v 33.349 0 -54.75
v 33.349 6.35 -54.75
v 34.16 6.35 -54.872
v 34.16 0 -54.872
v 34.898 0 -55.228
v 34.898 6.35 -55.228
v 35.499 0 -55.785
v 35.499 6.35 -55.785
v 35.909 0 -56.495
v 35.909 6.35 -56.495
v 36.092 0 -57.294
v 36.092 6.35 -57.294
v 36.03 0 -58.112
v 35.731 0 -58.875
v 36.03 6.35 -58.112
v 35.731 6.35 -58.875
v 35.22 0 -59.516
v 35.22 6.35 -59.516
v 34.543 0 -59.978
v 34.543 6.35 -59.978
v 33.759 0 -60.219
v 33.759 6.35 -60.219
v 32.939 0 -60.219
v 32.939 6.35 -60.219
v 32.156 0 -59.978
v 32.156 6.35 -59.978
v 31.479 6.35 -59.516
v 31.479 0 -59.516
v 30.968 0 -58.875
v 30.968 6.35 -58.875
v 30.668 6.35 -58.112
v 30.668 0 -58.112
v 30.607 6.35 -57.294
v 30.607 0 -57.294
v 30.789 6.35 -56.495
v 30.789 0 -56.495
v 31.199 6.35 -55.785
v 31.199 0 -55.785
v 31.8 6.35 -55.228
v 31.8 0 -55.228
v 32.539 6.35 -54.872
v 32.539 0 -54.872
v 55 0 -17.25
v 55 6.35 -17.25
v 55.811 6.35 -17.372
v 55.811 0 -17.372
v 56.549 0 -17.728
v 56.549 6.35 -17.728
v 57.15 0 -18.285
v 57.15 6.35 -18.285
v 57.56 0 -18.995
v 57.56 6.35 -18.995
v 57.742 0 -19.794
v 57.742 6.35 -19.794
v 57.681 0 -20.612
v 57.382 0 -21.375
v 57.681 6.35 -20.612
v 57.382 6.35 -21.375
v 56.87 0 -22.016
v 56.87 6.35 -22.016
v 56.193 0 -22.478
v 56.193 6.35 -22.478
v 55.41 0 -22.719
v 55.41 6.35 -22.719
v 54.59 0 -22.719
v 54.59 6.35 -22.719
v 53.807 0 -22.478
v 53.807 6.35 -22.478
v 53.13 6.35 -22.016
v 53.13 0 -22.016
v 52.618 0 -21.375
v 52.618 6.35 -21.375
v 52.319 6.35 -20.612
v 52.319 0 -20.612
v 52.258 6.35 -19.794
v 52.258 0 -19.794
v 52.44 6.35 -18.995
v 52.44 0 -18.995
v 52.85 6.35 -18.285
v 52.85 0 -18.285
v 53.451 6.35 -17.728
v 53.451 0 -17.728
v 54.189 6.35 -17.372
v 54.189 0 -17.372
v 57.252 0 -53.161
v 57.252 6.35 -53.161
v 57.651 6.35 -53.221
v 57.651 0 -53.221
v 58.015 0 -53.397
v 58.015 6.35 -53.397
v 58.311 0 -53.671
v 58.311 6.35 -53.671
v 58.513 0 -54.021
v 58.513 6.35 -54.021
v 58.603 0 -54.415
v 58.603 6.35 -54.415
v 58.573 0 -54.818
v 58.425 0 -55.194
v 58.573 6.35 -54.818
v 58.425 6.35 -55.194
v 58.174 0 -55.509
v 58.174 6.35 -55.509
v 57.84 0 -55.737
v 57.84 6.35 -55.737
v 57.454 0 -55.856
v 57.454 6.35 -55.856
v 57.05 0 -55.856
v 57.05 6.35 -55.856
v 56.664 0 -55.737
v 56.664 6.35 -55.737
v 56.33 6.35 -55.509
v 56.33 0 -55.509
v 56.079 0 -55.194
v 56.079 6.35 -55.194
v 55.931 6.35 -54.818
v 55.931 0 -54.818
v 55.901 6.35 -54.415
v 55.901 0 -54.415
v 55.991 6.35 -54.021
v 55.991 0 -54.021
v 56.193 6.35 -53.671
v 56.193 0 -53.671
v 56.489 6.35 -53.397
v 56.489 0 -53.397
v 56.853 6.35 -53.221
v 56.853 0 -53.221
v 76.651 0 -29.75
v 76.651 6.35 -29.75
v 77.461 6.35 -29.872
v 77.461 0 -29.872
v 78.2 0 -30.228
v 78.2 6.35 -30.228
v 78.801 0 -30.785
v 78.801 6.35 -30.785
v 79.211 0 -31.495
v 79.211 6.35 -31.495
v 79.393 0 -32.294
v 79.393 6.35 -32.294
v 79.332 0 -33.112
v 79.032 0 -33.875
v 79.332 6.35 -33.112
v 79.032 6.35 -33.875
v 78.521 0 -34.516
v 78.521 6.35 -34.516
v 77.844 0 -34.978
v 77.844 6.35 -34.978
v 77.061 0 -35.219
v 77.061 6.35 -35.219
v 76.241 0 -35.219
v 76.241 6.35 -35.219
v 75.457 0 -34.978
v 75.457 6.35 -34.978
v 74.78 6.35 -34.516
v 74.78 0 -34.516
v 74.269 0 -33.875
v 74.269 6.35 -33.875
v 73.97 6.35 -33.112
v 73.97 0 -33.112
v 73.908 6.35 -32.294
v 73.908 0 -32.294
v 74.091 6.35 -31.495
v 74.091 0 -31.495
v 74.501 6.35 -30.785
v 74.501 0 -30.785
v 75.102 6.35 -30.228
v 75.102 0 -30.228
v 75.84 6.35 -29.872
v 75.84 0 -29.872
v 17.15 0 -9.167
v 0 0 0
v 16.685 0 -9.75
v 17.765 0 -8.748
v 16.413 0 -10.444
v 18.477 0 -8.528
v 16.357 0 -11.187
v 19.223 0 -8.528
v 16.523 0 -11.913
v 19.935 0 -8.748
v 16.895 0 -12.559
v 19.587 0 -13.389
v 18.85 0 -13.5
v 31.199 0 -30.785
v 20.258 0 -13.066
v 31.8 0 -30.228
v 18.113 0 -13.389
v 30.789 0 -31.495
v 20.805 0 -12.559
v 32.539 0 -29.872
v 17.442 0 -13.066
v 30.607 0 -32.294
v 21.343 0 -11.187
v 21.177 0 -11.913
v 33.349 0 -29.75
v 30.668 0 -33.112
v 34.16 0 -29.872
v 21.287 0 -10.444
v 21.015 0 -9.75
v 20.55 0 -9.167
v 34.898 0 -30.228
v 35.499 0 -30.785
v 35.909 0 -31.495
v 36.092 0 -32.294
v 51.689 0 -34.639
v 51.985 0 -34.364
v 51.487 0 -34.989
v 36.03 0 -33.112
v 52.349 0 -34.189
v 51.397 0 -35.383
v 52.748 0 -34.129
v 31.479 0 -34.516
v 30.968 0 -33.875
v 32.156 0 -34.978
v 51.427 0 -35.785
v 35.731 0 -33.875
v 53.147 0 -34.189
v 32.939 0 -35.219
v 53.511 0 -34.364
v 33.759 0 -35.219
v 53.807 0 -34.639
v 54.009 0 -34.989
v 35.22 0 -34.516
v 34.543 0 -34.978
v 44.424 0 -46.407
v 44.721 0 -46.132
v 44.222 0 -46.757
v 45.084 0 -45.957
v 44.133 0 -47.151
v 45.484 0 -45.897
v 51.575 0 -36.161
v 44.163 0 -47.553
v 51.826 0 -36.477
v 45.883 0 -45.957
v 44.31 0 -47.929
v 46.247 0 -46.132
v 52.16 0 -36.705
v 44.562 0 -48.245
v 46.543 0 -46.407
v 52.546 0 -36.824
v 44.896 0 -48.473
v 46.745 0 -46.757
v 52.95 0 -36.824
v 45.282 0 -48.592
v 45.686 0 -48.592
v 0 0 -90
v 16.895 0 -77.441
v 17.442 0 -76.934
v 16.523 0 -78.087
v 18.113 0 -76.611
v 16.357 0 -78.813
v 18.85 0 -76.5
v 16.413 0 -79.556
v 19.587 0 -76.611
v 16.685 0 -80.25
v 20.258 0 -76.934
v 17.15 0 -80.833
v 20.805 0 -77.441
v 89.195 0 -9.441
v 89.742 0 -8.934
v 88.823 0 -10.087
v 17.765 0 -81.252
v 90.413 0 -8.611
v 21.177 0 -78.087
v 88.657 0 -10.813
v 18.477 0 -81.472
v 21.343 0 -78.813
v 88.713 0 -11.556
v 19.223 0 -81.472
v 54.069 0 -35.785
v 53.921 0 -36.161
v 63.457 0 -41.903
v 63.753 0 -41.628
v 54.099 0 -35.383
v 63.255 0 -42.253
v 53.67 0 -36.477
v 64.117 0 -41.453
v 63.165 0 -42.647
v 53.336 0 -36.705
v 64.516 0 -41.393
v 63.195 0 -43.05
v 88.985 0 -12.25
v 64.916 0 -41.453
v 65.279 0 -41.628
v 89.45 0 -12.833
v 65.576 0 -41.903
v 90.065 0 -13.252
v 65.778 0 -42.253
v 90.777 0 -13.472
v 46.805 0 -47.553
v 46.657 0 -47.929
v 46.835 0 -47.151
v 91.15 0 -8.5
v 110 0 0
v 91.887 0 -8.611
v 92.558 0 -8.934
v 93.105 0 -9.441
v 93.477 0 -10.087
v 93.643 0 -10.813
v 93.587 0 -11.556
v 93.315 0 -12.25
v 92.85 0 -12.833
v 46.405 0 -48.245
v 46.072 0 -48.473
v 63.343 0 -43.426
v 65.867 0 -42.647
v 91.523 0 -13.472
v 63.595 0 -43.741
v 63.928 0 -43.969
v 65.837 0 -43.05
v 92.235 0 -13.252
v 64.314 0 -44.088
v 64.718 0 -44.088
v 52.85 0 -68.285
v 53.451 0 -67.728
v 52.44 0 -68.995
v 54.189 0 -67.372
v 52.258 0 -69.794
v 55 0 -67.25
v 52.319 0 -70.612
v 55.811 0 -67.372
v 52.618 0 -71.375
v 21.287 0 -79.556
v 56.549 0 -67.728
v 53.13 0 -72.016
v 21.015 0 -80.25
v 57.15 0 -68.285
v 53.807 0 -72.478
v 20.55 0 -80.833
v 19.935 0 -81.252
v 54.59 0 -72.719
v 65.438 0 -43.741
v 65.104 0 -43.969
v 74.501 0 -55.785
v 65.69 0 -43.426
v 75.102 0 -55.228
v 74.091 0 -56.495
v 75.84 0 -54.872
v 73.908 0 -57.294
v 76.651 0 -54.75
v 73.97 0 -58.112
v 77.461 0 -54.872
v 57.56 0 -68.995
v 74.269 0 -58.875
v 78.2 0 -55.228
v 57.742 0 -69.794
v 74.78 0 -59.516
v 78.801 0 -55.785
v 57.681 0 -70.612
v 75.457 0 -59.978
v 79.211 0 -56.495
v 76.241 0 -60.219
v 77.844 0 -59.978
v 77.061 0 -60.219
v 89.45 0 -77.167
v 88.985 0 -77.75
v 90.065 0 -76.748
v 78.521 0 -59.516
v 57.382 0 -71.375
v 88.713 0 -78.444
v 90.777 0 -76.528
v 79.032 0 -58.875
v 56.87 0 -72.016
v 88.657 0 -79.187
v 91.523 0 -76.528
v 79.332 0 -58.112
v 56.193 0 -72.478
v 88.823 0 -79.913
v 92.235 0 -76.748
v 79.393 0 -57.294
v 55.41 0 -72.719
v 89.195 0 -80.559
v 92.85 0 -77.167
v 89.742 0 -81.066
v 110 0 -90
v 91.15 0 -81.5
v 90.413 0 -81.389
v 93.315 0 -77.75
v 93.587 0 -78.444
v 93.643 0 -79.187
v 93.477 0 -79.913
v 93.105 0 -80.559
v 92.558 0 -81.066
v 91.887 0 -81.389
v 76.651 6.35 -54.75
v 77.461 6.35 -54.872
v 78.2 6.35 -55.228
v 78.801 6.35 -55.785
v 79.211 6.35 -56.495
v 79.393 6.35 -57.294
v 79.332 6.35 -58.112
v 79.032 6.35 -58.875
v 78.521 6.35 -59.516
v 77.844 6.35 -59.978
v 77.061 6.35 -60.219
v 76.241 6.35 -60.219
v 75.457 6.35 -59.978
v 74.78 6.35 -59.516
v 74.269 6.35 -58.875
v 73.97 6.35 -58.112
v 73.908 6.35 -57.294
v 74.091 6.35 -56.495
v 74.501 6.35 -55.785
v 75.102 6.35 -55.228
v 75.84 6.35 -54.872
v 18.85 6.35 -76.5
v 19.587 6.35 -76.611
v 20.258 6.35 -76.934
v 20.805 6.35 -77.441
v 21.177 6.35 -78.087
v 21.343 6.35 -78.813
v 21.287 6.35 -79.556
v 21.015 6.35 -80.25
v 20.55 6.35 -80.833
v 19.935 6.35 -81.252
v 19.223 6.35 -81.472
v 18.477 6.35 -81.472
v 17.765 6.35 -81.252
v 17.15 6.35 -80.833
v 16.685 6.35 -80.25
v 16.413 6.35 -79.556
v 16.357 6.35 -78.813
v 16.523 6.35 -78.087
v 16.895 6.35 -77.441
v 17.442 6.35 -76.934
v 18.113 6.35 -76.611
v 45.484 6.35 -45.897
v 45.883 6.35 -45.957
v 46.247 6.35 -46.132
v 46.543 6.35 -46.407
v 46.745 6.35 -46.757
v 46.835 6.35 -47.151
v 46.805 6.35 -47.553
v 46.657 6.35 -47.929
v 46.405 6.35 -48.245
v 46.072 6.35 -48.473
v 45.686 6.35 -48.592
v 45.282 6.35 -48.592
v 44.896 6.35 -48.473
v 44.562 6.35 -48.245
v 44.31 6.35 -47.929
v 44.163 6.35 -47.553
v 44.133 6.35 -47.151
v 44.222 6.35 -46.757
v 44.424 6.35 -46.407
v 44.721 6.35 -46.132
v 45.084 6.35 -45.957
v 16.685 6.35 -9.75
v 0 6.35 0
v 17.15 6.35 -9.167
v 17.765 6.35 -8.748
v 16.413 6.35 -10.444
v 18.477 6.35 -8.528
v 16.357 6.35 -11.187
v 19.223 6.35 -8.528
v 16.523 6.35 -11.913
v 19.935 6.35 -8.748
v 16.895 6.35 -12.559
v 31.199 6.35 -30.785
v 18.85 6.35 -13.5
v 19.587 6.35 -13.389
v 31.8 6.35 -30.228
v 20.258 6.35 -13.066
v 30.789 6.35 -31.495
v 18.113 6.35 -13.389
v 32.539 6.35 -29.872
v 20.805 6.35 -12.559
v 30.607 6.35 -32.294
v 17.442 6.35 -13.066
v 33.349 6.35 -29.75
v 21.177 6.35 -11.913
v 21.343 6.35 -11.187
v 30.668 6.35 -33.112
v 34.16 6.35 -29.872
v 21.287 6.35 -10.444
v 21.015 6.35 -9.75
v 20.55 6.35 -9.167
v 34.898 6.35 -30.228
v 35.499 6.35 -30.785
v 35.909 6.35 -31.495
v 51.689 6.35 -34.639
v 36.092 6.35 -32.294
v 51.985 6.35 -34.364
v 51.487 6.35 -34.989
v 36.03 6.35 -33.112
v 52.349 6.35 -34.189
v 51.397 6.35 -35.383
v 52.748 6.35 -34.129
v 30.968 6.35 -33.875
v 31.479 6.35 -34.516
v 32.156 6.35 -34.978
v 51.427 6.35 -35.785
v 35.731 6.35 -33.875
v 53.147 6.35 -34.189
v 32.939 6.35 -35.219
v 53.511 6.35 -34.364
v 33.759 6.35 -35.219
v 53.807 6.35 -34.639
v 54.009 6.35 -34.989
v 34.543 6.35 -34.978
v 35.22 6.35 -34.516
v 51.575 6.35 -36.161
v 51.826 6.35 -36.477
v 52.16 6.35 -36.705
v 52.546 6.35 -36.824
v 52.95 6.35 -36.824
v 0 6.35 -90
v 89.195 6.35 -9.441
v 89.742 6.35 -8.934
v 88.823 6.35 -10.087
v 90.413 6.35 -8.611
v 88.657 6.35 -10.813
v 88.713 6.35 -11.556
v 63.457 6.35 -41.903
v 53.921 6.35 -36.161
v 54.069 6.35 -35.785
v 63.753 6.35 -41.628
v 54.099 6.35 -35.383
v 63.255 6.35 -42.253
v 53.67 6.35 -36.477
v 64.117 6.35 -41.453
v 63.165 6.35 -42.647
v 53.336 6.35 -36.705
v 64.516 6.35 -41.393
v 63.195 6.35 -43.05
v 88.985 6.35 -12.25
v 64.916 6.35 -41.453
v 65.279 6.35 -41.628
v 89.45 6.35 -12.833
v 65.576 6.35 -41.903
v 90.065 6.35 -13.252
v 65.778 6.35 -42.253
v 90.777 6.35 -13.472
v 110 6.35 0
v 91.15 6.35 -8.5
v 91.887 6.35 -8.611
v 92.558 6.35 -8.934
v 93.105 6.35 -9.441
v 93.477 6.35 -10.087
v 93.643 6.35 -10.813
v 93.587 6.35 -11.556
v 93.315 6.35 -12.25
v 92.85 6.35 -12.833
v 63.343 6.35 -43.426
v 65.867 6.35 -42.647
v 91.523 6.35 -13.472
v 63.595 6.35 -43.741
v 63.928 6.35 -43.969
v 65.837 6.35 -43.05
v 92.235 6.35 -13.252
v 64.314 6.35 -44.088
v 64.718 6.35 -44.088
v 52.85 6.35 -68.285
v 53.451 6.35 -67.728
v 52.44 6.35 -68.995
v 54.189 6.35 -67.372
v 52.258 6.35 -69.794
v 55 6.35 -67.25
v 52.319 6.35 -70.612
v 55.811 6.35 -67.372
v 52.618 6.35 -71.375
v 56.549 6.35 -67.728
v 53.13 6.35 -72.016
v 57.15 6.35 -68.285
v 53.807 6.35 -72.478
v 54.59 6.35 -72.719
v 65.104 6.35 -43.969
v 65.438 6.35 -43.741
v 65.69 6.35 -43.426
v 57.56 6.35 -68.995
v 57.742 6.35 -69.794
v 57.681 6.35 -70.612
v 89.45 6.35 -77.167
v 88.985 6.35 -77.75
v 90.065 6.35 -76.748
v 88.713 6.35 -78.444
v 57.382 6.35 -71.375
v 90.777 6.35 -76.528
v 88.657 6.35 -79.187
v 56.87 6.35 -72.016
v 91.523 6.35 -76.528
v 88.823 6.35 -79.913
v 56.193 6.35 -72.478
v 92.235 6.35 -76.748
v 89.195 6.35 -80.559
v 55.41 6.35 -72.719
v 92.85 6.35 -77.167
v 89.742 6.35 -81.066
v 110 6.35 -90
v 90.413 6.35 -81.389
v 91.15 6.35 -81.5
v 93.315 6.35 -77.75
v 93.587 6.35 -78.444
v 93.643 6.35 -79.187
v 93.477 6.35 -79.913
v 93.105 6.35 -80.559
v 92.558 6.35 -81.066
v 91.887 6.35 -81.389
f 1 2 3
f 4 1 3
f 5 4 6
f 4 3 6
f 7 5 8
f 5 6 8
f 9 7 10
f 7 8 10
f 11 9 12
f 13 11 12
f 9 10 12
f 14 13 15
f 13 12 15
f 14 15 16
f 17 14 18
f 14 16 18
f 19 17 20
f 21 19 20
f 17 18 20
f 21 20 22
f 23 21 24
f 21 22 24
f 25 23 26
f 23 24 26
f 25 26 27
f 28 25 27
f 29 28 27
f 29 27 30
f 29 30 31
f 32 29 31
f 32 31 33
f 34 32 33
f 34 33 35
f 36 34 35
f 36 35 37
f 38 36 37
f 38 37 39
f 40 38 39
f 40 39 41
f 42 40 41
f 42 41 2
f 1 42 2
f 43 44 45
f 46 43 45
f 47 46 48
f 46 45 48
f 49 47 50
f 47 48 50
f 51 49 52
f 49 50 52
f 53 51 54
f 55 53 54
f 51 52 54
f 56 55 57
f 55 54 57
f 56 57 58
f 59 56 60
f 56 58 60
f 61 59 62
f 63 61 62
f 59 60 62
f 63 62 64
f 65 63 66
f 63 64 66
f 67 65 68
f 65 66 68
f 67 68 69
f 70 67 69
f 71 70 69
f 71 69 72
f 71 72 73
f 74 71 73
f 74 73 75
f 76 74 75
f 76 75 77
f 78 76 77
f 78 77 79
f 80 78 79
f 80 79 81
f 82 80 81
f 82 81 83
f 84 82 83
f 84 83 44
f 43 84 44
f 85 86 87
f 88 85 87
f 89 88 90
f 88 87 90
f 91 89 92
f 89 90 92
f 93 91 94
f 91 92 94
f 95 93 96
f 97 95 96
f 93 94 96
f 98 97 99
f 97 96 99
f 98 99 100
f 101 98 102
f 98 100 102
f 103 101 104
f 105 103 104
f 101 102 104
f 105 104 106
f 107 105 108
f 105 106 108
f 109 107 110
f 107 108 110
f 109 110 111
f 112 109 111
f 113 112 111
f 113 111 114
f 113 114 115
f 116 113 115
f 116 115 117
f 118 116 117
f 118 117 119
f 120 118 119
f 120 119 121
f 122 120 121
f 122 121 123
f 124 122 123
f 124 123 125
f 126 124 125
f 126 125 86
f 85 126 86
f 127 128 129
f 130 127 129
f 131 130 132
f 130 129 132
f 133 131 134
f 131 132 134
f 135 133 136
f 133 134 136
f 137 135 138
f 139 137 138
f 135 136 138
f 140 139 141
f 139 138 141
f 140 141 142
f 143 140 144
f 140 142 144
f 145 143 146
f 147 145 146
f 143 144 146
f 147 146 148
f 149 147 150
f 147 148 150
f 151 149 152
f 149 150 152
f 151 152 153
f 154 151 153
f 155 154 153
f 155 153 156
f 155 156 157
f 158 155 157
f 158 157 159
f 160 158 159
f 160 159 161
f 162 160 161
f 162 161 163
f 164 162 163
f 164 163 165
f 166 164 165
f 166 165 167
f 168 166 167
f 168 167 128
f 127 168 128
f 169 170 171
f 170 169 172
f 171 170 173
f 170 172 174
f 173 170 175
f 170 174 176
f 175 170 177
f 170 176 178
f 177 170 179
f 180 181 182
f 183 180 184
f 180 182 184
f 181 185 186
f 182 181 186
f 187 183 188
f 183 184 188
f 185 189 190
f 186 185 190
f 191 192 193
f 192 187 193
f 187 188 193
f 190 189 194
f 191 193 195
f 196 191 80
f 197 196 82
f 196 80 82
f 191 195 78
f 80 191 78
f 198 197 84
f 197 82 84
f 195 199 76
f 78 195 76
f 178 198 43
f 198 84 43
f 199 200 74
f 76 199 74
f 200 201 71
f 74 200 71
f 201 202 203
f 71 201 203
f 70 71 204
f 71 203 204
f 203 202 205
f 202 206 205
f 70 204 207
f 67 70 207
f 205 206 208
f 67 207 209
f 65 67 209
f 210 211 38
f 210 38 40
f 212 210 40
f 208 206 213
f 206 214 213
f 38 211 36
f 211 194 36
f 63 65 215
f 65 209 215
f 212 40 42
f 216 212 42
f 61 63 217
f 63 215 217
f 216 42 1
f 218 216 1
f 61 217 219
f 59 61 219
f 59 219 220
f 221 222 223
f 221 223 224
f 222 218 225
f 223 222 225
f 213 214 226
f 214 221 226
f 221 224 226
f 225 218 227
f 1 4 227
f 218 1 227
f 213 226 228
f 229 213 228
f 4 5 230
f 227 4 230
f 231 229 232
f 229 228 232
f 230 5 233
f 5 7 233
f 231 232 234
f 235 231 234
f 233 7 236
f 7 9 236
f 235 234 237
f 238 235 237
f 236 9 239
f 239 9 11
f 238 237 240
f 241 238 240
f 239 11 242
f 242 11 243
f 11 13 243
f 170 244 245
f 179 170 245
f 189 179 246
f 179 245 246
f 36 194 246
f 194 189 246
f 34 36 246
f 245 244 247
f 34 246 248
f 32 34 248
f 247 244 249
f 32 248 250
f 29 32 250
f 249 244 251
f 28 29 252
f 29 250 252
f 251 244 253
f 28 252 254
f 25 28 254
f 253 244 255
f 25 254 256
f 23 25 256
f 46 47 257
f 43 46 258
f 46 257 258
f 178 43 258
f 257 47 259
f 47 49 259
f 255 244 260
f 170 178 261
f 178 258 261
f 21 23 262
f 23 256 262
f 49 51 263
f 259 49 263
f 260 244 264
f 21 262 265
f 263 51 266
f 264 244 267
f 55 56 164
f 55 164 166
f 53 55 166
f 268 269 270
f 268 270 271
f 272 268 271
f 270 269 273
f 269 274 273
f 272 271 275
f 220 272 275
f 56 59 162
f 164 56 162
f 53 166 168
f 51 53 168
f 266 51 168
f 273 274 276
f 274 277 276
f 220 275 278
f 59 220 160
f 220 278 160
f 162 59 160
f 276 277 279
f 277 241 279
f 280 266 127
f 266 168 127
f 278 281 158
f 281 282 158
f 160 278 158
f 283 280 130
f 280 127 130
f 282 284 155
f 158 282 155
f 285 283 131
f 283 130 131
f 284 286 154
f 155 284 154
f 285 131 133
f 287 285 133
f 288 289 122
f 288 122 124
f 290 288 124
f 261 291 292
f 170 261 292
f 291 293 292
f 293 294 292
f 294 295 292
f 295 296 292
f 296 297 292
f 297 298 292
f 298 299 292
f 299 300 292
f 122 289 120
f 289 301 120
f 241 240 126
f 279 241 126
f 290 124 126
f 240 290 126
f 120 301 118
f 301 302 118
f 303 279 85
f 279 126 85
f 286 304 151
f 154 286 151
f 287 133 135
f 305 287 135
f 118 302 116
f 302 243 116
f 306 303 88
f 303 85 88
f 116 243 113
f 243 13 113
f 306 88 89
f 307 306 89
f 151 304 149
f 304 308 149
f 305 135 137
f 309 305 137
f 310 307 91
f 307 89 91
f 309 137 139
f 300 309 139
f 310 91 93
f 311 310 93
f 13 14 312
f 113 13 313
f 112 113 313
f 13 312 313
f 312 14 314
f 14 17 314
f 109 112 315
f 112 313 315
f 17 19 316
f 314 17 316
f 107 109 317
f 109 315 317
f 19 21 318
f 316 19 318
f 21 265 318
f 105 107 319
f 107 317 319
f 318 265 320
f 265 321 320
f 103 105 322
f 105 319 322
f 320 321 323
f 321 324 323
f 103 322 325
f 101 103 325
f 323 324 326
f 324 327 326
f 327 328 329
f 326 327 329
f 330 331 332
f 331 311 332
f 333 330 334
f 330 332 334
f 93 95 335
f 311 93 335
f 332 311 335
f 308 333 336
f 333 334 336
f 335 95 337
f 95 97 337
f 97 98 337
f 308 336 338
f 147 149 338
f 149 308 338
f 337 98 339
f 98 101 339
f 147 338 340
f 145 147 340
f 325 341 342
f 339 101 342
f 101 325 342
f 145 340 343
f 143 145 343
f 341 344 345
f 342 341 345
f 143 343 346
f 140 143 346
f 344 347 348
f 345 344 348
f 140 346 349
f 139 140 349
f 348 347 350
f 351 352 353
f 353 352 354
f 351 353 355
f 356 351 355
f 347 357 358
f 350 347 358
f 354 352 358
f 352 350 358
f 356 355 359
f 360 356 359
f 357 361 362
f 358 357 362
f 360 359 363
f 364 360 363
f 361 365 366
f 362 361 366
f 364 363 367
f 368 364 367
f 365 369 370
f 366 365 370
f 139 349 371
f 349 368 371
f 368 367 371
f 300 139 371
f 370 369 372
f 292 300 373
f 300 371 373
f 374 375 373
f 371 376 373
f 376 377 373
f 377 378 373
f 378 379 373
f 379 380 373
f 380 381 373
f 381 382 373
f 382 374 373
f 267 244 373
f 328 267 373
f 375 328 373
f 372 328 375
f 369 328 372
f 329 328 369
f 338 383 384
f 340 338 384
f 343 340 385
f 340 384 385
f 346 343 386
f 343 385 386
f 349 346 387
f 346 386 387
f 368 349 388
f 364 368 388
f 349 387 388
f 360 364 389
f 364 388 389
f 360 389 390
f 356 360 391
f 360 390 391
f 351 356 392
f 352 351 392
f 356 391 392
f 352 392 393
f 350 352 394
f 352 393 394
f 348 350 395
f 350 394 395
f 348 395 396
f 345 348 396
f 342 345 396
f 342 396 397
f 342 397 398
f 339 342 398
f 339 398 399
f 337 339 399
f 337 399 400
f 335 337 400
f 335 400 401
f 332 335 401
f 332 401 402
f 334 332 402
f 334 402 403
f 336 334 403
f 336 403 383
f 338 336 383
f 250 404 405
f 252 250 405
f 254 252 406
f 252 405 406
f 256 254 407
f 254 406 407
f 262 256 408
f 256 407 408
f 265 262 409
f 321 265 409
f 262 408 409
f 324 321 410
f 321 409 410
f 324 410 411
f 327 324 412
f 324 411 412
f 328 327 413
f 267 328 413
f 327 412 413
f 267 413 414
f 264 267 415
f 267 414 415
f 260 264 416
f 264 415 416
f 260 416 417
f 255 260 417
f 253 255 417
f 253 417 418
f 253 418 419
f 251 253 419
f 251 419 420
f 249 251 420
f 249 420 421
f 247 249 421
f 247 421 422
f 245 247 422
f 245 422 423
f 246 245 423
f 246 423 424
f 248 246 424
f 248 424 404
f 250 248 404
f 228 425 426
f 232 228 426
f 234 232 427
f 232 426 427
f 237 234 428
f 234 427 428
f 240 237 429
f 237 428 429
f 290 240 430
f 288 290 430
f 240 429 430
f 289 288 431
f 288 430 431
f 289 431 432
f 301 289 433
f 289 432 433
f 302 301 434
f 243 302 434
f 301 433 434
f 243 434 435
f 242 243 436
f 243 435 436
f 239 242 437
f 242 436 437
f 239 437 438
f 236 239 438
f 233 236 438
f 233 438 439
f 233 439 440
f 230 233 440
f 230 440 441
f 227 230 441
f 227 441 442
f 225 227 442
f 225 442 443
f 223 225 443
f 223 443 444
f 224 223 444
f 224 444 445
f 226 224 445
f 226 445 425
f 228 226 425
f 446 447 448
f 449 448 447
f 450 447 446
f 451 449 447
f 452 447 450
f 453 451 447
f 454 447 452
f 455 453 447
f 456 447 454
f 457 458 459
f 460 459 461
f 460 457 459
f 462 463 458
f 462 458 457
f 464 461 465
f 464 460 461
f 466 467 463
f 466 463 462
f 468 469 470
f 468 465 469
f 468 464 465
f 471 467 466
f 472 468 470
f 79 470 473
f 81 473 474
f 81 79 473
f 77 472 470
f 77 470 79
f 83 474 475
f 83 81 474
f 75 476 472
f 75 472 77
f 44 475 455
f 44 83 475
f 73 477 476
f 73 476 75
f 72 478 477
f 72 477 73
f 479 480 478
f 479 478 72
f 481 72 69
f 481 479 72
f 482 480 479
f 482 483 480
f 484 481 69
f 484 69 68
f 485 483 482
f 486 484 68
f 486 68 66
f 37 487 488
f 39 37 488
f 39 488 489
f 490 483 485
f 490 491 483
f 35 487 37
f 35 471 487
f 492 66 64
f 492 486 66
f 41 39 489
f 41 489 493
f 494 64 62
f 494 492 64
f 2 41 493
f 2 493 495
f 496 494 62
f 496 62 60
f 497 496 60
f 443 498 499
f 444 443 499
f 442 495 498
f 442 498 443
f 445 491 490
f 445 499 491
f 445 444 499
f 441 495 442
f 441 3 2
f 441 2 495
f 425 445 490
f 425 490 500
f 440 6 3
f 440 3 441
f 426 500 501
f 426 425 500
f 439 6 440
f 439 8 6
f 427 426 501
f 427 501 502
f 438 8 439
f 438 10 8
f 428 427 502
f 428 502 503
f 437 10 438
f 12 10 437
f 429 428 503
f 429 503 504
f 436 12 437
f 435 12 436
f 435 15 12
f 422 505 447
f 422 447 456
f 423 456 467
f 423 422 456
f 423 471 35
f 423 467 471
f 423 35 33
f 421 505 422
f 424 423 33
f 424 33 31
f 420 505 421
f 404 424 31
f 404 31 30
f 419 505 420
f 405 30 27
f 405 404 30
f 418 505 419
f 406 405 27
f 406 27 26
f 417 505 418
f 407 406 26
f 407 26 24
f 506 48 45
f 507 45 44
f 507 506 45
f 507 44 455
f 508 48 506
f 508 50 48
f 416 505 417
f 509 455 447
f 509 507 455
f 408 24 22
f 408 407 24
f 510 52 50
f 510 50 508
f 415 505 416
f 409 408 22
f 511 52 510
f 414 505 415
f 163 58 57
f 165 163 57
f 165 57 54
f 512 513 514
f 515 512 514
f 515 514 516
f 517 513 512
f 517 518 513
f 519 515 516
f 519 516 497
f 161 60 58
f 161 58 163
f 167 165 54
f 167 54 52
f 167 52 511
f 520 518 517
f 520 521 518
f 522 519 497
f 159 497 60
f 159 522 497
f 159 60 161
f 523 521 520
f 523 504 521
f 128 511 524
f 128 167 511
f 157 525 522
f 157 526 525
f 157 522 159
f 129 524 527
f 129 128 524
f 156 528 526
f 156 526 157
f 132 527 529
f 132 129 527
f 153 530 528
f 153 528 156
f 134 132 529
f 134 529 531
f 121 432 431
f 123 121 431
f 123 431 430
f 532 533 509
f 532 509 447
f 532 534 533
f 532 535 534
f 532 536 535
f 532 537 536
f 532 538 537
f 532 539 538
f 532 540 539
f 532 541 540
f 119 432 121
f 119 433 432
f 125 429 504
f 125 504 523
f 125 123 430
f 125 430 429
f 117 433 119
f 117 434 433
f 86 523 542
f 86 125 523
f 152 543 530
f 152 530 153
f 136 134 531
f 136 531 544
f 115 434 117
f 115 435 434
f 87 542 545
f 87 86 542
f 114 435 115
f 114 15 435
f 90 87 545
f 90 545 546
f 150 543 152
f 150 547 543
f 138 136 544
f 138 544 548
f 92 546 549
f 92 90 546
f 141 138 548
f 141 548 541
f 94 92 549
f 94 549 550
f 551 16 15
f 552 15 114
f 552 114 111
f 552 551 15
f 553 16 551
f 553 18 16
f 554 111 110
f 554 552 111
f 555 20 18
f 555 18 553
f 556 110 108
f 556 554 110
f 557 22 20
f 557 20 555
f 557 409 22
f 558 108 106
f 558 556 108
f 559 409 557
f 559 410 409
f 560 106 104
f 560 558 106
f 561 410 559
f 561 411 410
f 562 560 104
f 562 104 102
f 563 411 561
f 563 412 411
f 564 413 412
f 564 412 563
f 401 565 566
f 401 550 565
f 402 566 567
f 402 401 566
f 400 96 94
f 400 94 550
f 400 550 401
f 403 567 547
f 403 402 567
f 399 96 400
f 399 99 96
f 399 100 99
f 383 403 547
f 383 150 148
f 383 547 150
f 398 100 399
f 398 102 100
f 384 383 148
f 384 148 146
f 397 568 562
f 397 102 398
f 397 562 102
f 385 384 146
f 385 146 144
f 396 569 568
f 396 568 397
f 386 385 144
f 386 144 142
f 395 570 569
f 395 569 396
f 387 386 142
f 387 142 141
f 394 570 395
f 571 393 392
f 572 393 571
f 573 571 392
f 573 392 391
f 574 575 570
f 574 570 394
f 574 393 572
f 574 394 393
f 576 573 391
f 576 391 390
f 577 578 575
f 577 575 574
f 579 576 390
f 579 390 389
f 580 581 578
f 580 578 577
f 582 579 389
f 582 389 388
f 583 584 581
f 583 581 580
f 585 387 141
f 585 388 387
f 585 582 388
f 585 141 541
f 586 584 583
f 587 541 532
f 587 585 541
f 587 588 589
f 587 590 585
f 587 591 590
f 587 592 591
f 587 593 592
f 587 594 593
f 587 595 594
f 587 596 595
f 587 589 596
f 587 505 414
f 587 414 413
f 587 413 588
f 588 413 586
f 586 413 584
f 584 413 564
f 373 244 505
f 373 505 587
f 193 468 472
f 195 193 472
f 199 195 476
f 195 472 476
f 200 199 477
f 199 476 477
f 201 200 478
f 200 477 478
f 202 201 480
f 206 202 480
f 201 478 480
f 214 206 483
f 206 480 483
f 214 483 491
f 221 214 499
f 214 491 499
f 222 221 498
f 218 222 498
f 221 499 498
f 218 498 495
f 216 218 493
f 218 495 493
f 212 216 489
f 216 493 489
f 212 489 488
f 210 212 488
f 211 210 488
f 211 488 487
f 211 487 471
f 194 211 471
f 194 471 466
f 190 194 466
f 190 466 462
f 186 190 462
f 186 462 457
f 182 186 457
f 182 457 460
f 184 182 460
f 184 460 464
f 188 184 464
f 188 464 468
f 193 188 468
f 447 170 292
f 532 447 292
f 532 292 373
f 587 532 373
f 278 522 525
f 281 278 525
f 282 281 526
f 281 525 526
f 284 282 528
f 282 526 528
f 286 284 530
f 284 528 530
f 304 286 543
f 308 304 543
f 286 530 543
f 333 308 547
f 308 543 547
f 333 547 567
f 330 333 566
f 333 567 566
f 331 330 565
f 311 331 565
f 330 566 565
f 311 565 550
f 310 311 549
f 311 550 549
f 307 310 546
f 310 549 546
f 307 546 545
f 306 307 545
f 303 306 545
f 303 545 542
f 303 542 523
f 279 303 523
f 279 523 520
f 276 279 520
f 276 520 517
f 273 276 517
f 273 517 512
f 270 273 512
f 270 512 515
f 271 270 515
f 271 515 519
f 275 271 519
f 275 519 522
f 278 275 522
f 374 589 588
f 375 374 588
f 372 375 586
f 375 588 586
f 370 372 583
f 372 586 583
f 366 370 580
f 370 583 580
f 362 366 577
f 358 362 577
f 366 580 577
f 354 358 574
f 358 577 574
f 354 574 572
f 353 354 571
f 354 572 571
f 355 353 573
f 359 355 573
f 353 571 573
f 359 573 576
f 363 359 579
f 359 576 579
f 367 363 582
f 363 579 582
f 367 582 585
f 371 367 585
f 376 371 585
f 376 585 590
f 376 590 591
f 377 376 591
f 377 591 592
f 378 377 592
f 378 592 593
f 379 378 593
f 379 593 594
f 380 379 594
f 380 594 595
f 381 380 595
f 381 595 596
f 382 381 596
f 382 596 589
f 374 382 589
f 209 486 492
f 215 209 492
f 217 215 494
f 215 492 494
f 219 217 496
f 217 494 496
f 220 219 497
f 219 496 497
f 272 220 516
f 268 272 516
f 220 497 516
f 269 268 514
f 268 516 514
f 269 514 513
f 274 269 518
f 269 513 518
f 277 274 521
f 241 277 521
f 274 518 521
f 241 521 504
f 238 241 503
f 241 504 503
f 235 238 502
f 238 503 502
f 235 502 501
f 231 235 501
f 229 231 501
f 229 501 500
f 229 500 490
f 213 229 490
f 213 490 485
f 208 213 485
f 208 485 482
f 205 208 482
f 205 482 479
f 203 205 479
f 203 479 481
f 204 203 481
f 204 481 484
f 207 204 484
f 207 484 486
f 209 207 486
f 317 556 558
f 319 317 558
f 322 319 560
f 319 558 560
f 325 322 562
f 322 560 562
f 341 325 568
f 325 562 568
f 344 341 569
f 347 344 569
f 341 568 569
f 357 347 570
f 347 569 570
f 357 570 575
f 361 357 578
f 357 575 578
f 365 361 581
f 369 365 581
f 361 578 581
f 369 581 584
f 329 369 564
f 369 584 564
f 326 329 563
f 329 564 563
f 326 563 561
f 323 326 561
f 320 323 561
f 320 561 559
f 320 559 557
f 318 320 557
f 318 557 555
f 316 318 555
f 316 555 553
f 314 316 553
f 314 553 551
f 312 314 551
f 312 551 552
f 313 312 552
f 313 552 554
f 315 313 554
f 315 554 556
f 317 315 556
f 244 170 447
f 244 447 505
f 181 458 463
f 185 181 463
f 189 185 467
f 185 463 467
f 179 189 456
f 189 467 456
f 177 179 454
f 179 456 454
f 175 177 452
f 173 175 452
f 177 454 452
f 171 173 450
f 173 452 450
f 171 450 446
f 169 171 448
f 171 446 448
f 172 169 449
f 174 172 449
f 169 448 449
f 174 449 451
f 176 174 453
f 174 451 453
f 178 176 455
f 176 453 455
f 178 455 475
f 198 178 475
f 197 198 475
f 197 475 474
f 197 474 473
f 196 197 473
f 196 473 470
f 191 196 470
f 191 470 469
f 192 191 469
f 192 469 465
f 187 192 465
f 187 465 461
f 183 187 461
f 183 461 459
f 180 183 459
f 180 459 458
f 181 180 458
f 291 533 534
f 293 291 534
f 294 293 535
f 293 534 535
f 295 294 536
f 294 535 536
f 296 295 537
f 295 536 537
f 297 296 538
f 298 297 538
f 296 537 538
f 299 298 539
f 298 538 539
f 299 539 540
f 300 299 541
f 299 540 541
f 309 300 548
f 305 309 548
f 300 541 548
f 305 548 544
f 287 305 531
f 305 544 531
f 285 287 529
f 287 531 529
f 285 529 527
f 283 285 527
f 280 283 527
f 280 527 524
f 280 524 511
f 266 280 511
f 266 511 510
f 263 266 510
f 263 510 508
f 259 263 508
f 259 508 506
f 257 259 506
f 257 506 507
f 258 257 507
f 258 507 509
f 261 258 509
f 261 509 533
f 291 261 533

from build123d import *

# Parameters (mm, degrees)
SKETCH2_W            = 110
SKETCH2_H            = 90
BOSS_EXTRUDE1_DEPTH  = 6.35
SKETCH3_R            = 2.5
MOUNTING_HOLES_DEPTH = 143.268487375
CUT_EXTRUDE1_REACH   = 144.268
SKETCH4_R            = 2.75
CUT_EXTRUDE2_REACH   = 144.268
SKETCH5_R            = 1.355


with BuildPart() as part:
    # Sketch2 → Boss-Extrude1 (new body)
    with BuildSketch(Plane(origin=(0, 0, 0), x_dir=(1, 0, 0), z_dir=(0, 1, 0))):
        with Locations((55, 45)):
            Rectangle(SKETCH2_W, SKETCH2_H)
    extrude(amount=BOSS_EXTRUDE1_DEPTH)

    # Sketch3 → Mounting Holes (cut, through all)
    with BuildSketch(Plane(origin=(0, 6.35, 0), x_dir=(1, 0, 0), z_dir=(0, 1, 0))):
        with Locations(Location((18.85, 79, 0), (0, 0, 270))):
            Circle(SKETCH3_R)
        with Locations(Location((18.85, 11, 0), (0, 0, 90))):
            Circle(SKETCH3_R)
        with Locations(Location((91.15, 11, 0), (0, 0, 270))):
            Circle(SKETCH3_R)
        with Locations(Location((91.15, 79, 0), (0, 0, 90))):
            Circle(SKETCH3_R)
    extrude(amount=-MOUNTING_HOLES_DEPTH, mode=Mode.SUBTRACT)

    # Sketch4 → Cut-Extrude1 (cut, up to next)
    with BuildSketch(Plane(origin=(0, 6.35, 0), x_dir=(1, 0, 0), z_dir=(0, 1, 0)), mode=Mode.PRIVATE) as cut_extrude1_sk1:
        with Locations(Location((55, 70, 0), (0, 0, 270))):
            Circle(SKETCH4_R)
    cut_extrude1_tool1 = extrude(cut_extrude1_sk1.sketch, amount=-CUT_EXTRUDE1_REACH, mode=Mode.PRIVATE) & part.part
    # Sketch4 → Cut-Extrude1 (cut, up to next)
    with BuildSketch(Plane(origin=(0, 6.35, 0), x_dir=(1, 0, 0), z_dir=(0, 1, 0)), mode=Mode.PRIVATE) as cut_extrude1_sk2:
        with Locations(Location((76.650635095, 57.5, 0), (0, 0, 270))):
            Circle(SKETCH4_R)
    cut_extrude1_tool2 = extrude(cut_extrude1_sk2.sketch, amount=-CUT_EXTRUDE1_REACH, mode=Mode.PRIVATE) & part.part
    # Sketch4 → Cut-Extrude1 (cut, up to next)
    with BuildSketch(Plane(origin=(0, 6.35, 0), x_dir=(1, 0, 0), z_dir=(0, 1, 0)), mode=Mode.PRIVATE) as cut_extrude1_sk3:
        with Locations(Location((76.650635095, 32.5, 0), (0, 0, 270))):
            Circle(SKETCH4_R)
    cut_extrude1_tool3 = extrude(cut_extrude1_sk3.sketch, amount=-CUT_EXTRUDE1_REACH, mode=Mode.PRIVATE) & part.part
    # Sketch4 → Cut-Extrude1 (cut, up to next)
    with BuildSketch(Plane(origin=(0, 6.35, 0), x_dir=(1, 0, 0), z_dir=(0, 1, 0)), mode=Mode.PRIVATE) as cut_extrude1_sk4:
        with Locations(Location((55, 20, 0), (0, 0, 270))):
            Circle(SKETCH4_R)
    cut_extrude1_tool4 = extrude(cut_extrude1_sk4.sketch, amount=-CUT_EXTRUDE1_REACH, mode=Mode.PRIVATE) & part.part
    # Sketch4 → Cut-Extrude1 (cut, up to next)
    with BuildSketch(Plane(origin=(0, 6.35, 0), x_dir=(1, 0, 0), z_dir=(0, 1, 0)), mode=Mode.PRIVATE) as cut_extrude1_sk5:
        with Locations(Location((33.349364905, 32.5, 0), (0, 0, 270))):
            Circle(SKETCH4_R)
    cut_extrude1_tool5 = extrude(cut_extrude1_sk5.sketch, amount=-CUT_EXTRUDE1_REACH, mode=Mode.PRIVATE) & part.part
    # Sketch4 → Cut-Extrude1 (cut, up to next)
    with BuildSketch(Plane(origin=(0, 6.35, 0), x_dir=(1, 0, 0), z_dir=(0, 1, 0)), mode=Mode.PRIVATE) as cut_extrude1_sk6:
        with Locations(Location((33.349364905, 57.5, 0), (0, 0, 270))):
            Circle(SKETCH4_R)
    cut_extrude1_tool6 = extrude(cut_extrude1_sk6.sketch, amount=-CUT_EXTRUDE1_REACH, mode=Mode.PRIVATE) & part.part
    add(cut_extrude1_tool1.solids().sort_by_distance((55, 6.35, -70))[0], mode=Mode.SUBTRACT)
    add(cut_extrude1_tool2.solids().sort_by_distance((76.650635, 6.35, -57.5))[0], mode=Mode.SUBTRACT)
    add(cut_extrude1_tool3.solids().sort_by_distance((76.650635, 6.35, -32.5))[0], mode=Mode.SUBTRACT)
    add(cut_extrude1_tool4.solids().sort_by_distance((55, 6.35, -20))[0], mode=Mode.SUBTRACT)
    add(cut_extrude1_tool5.solids().sort_by_distance((33.349365, 6.35, -32.5))[0], mode=Mode.SUBTRACT)
    add(cut_extrude1_tool6.solids().sort_by_distance((33.349365, 6.35, -57.5))[0], mode=Mode.SUBTRACT)

    # Sketch5 → Cut-Extrude2 (cut, up to next)
    with BuildSketch(Plane(origin=(0, 6.35, 0), x_dir=(1, 0, 0), z_dir=(0, 1, 0)), mode=Mode.PRIVATE) as cut_extrude2_sk1:
        with Locations(Location((64.516169974, 42.748034189, 0), (0, 0, 270))):
            Circle(SKETCH5_R)
    cut_extrude2_tool1 = extrude(cut_extrude2_sk1.sketch, amount=-CUT_EXTRUDE2_REACH, mode=Mode.PRIVATE) & part.part
    # Sketch5 → Cut-Extrude2 (cut, up to next)
    with BuildSketch(Plane(origin=(0, 6.35, 0), x_dir=(1, 0, 0), z_dir=(0, 1, 0)), mode=Mode.PRIVATE) as cut_extrude2_sk2:
        with Locations(Location((45.483830025, 47.251965809, 0), (0, 0, 270))):
            Circle(SKETCH5_R)
    cut_extrude2_tool2 = extrude(cut_extrude2_sk2.sketch, amount=-CUT_EXTRUDE2_REACH, mode=Mode.PRIVATE) & part.part
    # Sketch5 → Cut-Extrude2 (cut, up to next)
    with BuildSketch(Plane(origin=(0, 6.35, 0), x_dir=(1, 0, 0), z_dir=(0, 1, 0)), mode=Mode.PRIVATE) as cut_extrude2_sk3:
        with Locations(Location((57.251965809, 54.516169974, 0), (0, 0, 270))):
            Circle(SKETCH5_R)
    cut_extrude2_tool3 = extrude(cut_extrude2_sk3.sketch, amount=-CUT_EXTRUDE2_REACH, mode=Mode.PRIVATE) & part.part
    # Sketch5 → Cut-Extrude2 (cut, up to next)
    with BuildSketch(Plane(origin=(0, 6.35, 0), x_dir=(1, 0, 0), z_dir=(0, 1, 0)), mode=Mode.PRIVATE) as cut_extrude2_sk4:
        with Locations(Location((52.74803419, 35.483830024, 0), (0, 0, 270))):
            Circle(SKETCH5_R)
    cut_extrude2_tool4 = extrude(cut_extrude2_sk4.sketch, amount=-CUT_EXTRUDE2_REACH, mode=Mode.PRIVATE) & part.part
    add(cut_extrude2_tool1.solids().sort_by_distance((64.51617, 6.35, -42.748034))[0], mode=Mode.SUBTRACT)
    add(cut_extrude2_tool2.solids().sort_by_distance((45.48383, 6.35, -47.251966))[0], mode=Mode.SUBTRACT)
    add(cut_extrude2_tool3.solids().sort_by_distance((57.251966, 6.35, -54.51617))[0], mode=Mode.SUBTRACT)
    add(cut_extrude2_tool4.solids().sort_by_distance((52.748034, 6.35, -35.48383))[0], mode=Mode.SUBTRACT)


solid = part.part
